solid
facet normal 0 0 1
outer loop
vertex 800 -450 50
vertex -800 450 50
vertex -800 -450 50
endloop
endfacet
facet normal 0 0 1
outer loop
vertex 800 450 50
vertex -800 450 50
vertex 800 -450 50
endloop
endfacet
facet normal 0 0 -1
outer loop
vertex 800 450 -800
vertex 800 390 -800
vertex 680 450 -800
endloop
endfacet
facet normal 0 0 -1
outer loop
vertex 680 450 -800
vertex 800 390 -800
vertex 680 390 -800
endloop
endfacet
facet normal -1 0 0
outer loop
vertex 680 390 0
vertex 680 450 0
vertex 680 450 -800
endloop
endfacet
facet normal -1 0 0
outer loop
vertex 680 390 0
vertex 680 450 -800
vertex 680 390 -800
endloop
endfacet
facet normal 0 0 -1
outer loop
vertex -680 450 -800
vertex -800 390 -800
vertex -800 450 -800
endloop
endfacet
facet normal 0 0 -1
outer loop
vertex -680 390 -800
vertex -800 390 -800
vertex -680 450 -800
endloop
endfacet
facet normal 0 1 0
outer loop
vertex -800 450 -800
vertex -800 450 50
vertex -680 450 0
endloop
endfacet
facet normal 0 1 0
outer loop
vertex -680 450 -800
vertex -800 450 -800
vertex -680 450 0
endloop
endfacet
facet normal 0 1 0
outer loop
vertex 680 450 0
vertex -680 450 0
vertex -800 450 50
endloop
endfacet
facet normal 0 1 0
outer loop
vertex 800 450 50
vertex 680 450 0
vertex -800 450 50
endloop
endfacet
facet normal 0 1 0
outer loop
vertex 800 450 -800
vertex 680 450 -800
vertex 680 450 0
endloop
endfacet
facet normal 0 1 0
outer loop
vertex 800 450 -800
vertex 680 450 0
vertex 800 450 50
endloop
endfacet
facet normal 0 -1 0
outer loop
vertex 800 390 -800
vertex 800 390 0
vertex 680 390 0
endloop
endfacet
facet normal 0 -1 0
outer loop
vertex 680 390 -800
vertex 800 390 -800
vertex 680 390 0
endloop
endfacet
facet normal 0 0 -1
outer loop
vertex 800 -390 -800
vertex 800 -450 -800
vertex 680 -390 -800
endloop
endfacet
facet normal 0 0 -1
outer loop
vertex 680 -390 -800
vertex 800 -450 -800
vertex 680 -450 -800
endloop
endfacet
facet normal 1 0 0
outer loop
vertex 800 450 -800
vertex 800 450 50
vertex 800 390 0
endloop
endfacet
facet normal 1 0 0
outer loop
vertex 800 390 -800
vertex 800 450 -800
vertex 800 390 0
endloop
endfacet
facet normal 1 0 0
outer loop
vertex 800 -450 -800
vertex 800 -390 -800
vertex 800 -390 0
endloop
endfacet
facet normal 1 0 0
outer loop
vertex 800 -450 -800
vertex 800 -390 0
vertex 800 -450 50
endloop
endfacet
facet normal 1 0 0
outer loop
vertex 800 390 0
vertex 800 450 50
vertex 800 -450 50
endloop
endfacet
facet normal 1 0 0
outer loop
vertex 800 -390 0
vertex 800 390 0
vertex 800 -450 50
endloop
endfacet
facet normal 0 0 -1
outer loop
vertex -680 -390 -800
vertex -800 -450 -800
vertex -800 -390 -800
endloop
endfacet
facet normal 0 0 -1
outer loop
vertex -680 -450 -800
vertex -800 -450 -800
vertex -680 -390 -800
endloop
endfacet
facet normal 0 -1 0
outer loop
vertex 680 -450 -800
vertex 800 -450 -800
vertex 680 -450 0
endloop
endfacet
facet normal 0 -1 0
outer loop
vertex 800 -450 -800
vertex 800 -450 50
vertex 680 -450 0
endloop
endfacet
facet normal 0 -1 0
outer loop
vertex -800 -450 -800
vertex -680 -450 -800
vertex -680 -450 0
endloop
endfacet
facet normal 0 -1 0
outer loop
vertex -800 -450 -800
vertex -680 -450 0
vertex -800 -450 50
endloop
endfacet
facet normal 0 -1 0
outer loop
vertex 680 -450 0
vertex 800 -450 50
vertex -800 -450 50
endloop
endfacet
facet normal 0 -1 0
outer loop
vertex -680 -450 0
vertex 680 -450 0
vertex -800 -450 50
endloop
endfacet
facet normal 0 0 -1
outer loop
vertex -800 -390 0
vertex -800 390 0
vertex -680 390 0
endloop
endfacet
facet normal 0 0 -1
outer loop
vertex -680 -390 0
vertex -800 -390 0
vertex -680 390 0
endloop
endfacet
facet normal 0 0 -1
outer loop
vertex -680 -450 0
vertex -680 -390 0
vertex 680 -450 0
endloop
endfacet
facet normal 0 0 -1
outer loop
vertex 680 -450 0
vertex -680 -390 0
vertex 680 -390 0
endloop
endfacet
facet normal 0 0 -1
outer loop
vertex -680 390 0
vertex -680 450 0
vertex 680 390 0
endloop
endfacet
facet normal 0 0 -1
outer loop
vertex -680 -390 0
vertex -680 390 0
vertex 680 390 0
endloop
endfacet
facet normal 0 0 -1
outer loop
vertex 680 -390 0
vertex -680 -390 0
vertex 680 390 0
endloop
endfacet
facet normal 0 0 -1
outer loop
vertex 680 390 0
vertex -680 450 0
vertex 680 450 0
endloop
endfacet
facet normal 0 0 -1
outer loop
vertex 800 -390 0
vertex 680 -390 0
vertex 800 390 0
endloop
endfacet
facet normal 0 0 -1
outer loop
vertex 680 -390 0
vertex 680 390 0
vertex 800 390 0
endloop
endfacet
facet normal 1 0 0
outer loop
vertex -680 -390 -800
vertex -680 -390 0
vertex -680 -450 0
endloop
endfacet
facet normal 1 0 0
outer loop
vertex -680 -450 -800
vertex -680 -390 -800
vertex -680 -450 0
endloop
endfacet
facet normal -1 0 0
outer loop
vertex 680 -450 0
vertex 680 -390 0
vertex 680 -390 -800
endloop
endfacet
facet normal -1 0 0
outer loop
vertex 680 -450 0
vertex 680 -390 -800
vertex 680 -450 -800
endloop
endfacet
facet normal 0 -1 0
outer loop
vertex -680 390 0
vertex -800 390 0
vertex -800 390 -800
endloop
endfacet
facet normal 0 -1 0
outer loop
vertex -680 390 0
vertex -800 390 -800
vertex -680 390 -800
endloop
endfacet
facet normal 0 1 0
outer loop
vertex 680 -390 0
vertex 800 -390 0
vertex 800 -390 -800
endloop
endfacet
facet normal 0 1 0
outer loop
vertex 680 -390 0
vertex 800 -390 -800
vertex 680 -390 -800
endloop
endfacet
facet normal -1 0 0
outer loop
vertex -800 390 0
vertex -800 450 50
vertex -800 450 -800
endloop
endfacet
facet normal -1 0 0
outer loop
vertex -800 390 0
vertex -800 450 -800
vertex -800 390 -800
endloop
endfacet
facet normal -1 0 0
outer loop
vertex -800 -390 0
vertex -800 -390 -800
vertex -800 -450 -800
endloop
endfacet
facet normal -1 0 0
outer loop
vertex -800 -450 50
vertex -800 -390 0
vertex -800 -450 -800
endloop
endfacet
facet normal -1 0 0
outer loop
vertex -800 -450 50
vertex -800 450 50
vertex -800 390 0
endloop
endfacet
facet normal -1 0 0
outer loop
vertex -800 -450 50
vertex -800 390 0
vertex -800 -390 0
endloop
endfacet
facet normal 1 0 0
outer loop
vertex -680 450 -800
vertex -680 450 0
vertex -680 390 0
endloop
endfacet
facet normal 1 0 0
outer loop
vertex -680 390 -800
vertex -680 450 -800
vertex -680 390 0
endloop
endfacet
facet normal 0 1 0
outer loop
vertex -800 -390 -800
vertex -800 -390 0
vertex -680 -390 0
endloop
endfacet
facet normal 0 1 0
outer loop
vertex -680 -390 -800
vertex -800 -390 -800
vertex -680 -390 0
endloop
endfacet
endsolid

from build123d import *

# Parameters (mm, degrees)
F0_W     = 1600
F0_H     = 900
F1_DEPTH = 50
F2_W     = 120
F2_H     = 60
F3_DEPTH = 800


# Not quite as in the source:
# - a pattern or mirror of a feature is missing from the dataset's text; its kind, count and spacing are read off the source's solid


with BuildPart() as f1:
    # F0 (on Top) → F1 (new body)
    with BuildSketch(Plane.XY):
        Rectangle(F0_W, F0_H)
    extrude(amount=F1_DEPTH)

    # F2 (on face) → F3 (join)
    with BuildSketch(Plane(origin=(0, 0, 0), x_dir=(1, 0, 0), z_dir=(0, 0, -1))):
        with Locations((-740, 420)):
            Rectangle(F2_W, F2_H)
        with Locations((-740, -420)):
            Rectangle(F2_W, F2_H)
    f3 = extrude(amount=F3_DEPTH)

    # F3_copies: F3 across plane
    add(f3.mirror(Plane(origin=(0, 0, 0), x_dir=(0, 0, 1), z_dir=(1, 0, 0))))


solid = f1.part
